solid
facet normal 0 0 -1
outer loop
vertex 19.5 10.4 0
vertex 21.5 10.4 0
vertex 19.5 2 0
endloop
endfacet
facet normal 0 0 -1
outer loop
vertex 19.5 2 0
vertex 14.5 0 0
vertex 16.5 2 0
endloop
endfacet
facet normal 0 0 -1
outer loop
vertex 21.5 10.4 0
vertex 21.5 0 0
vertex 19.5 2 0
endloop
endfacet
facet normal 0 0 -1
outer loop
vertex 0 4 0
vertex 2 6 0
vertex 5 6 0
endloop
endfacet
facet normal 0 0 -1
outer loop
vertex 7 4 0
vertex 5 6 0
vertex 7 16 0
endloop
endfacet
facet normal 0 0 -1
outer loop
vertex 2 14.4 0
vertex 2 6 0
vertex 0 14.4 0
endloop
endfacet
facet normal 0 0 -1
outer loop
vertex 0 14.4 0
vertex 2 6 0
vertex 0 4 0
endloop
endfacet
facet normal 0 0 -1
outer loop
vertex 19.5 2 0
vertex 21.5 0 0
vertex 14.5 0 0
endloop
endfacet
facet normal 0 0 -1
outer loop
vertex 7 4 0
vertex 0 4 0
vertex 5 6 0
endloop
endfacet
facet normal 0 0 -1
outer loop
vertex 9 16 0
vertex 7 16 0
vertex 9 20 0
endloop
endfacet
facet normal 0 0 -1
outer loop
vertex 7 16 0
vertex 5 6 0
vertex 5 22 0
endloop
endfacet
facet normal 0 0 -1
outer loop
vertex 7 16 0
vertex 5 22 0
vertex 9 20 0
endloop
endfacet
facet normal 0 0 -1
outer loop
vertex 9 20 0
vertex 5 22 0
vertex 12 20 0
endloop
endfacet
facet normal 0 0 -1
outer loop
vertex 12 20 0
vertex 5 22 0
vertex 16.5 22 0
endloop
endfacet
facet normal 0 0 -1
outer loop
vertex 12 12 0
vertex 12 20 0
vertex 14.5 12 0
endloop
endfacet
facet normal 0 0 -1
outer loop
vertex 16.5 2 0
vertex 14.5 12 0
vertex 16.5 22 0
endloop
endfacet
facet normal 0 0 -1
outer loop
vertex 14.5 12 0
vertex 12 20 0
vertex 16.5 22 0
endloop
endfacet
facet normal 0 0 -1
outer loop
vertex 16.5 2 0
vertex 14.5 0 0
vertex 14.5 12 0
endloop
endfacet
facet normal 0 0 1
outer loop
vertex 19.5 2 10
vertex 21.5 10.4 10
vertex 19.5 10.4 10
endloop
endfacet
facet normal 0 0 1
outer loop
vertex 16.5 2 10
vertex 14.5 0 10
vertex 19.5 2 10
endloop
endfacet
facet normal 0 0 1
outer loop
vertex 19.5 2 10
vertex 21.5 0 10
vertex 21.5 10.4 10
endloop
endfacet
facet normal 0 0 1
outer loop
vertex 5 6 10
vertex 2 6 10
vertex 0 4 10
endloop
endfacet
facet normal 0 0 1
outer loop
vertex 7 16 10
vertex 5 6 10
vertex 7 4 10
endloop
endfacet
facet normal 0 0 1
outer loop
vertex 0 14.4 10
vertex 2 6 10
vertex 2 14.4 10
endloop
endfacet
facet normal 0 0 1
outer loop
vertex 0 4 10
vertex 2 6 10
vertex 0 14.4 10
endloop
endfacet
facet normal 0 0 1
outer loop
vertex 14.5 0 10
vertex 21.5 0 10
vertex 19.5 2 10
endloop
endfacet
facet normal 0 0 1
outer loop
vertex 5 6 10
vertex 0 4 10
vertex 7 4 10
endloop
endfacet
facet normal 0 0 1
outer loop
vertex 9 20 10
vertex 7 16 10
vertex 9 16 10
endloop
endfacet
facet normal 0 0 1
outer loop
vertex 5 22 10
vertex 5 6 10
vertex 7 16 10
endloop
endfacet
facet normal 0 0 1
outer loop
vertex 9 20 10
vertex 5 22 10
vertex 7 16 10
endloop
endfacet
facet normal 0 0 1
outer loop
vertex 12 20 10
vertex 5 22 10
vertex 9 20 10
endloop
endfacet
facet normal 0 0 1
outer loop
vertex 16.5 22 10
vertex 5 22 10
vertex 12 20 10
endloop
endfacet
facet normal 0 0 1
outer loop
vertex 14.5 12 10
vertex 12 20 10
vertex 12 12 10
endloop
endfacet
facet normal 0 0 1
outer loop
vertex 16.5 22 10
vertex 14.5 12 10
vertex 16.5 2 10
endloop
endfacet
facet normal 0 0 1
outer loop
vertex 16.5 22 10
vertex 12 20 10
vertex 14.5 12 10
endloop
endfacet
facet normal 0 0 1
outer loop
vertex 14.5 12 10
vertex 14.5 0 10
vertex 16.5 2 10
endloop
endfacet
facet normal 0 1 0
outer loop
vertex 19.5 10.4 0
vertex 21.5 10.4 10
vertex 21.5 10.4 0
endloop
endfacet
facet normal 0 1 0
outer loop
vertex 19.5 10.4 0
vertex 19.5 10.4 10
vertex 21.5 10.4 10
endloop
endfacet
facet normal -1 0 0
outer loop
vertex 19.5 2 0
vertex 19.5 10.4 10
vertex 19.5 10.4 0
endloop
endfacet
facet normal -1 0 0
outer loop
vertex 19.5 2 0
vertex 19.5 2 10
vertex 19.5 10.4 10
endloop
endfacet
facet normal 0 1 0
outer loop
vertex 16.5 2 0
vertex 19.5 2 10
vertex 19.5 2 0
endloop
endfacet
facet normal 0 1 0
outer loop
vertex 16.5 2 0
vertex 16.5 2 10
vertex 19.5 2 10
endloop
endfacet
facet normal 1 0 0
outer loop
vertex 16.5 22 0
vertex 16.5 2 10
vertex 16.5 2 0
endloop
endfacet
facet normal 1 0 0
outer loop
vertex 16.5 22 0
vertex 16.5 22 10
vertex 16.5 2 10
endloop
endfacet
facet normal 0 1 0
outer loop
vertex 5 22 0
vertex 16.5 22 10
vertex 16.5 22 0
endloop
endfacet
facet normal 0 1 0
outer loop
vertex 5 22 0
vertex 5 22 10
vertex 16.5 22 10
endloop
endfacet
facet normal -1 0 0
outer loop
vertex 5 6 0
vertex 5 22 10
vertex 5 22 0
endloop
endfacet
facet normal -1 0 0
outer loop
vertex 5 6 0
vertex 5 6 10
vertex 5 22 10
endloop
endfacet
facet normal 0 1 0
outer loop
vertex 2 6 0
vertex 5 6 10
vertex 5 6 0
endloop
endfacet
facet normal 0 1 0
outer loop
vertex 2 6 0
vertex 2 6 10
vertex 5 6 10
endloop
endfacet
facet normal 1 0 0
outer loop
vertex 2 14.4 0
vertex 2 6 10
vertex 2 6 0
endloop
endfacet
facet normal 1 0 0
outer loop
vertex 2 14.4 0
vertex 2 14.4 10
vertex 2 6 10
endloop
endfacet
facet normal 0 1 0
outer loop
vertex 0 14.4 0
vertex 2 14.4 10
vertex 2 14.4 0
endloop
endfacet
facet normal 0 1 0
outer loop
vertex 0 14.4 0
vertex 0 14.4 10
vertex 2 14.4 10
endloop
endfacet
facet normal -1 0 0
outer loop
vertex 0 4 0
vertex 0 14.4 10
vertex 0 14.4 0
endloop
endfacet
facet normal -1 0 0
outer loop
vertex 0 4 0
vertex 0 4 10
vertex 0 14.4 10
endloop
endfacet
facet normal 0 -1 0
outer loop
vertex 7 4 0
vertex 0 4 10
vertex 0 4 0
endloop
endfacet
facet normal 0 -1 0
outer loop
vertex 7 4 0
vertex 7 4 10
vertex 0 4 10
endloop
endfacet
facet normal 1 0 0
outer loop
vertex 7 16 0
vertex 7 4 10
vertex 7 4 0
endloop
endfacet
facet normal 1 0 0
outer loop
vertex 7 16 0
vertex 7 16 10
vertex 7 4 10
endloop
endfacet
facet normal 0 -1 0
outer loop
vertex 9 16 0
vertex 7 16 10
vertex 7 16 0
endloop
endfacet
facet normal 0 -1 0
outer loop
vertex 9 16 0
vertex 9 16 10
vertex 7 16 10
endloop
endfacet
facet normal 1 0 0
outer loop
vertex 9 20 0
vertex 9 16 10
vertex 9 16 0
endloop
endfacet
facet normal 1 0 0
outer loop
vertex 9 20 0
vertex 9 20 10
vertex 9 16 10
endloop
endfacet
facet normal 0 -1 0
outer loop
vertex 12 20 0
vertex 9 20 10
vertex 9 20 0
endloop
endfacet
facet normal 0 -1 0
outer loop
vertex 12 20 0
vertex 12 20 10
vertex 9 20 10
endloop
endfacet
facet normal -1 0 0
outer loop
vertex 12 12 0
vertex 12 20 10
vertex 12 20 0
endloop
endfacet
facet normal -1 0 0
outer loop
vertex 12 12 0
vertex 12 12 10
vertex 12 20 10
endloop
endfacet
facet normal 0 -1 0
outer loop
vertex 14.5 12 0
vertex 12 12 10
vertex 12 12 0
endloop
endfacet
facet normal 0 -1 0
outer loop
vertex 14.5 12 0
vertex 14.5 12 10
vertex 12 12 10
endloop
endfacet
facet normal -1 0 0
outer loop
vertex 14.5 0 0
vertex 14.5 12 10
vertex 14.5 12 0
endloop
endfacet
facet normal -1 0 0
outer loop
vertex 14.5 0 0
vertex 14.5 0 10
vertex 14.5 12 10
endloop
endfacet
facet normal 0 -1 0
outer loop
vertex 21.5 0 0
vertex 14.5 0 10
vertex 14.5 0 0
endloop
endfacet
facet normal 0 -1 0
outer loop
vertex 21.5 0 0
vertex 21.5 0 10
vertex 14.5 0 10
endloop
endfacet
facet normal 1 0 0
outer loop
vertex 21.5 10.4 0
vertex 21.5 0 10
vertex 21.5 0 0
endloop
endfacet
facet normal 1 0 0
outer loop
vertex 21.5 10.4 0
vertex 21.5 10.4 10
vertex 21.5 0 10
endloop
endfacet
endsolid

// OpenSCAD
// file: config/led-hook-config.scad
strip_width = 12;
strip_height = 3;

clip_width = 10;

clip_thickness = 2;

box_wall_thickness = 2.5;
box_gap = 0.5;
box_inner_wall_thickness = 2;
box_inner_wall_inset = 4;
box_right_gap_drop = 8;

strip_width_fraction = 0.7;
strip_front_width = strip_width * strip_width_fraction;

double_wall_width = box_wall_thickness * 2 + box_gap + box_inner_wall_thickness;
// main file
include <./config/led-hook-config.scad>

left_side_height = box_right_gap_drop - box_inner_wall_inset;

linear_extrude(clip_width) {
  //   #####
  // # ## ##
  // # #  ## #
  // ###   # #
  //       ###
  polygon([
    // starting bottomg left and headed clockwise
    [0, left_side_height],
    [0, left_side_height + clip_thickness + strip_front_width],
    [clip_thickness, left_side_height + clip_thickness + strip_front_width],
    [clip_thickness, left_side_height + clip_thickness],
    [clip_thickness + strip_height, left_side_height + clip_thickness],
    [
      clip_thickness + strip_height,
      left_side_height + strip_width + box_inner_wall_inset + clip_thickness
    ],
    [
      clip_thickness + strip_height + clip_thickness + double_wall_width + clip_thickness,
      strip_width + box_right_gap_drop + clip_thickness,
    ],
    [clip_thickness + strip_height + clip_thickness + double_wall_width + clip_thickness, clip_thickness],
    [clip_thickness + strip_height + clip_thickness + double_wall_width + clip_thickness + strip_height, clip_thickness],
    [clip_thickness + strip_height + clip_thickness + double_wall_width + clip_thickness + strip_height, clip_thickness + strip_front_width],
    [clip_thickness + strip_height + clip_thickness + double_wall_width + clip_thickness + strip_height + clip_thickness, clip_thickness + strip_front_width],
    [clip_thickness + strip_height + clip_thickness + double_wall_width + clip_thickness + strip_height + clip_thickness, 0],
    [clip_thickness + strip_height + clip_thickness + double_wall_width, 0],
    [
      clip_thickness + strip_height + clip_thickness + double_wall_width,
      strip_width
    ],
    [clip_thickness + strip_height + clip_thickness + box_wall_thickness + box_gap + box_inner_wall_thickness, strip_width],
    [clip_thickness + strip_height + clip_thickness + box_wall_thickness + box_gap + box_inner_wall_thickness, strip_width + box_right_gap_drop],
    [clip_thickness + strip_height + clip_thickness + box_inner_wall_thickness, strip_width + box_right_gap_drop],
    [clip_thickness + strip_height + clip_thickness + box_inner_wall_thickness, strip_width + box_inner_wall_inset],
    [clip_thickness + strip_height + clip_thickness, strip_width + box_inner_wall_inset],
    [clip_thickness + strip_height + clip_thickness, left_side_height],
  ]);
}
